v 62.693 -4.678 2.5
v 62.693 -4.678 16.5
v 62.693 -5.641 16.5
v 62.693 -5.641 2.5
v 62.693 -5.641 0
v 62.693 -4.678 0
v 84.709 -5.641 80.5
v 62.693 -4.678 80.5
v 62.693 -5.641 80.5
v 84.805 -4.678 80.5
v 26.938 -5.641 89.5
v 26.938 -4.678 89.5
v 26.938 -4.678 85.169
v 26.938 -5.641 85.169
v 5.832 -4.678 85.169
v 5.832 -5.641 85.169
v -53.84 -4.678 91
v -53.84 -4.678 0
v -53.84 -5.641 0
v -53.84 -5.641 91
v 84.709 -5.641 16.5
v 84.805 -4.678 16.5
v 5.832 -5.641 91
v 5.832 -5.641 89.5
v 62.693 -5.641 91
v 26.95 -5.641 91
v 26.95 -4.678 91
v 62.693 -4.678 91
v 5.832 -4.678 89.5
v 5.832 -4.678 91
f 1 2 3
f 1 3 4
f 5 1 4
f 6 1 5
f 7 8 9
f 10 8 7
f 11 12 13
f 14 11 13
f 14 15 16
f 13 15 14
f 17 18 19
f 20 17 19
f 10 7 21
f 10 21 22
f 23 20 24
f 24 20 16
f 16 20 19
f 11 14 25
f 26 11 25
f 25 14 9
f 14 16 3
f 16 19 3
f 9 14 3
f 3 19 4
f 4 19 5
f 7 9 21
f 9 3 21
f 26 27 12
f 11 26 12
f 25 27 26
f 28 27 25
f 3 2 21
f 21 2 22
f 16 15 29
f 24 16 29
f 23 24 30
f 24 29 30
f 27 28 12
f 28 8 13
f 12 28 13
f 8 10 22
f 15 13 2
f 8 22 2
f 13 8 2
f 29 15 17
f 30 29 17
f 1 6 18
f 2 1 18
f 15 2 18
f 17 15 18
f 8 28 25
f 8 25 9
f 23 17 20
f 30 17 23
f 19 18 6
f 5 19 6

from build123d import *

# Parameters (mm, degrees)
SALIENTE_EXTRUIR1_DEPTH = 91
CROQUIS3_W              = 21.106040847
CROQUIS3_H              = 4.330702007
CROQUIS3_W_2            = 30.122472971
CROQUIS3_H_2            = 14
CORTAR_EXTRUIR2_DEPTH   = 91
CROQUIS4_W              = 22.111814678
CROQUIS4_H              = 2.5
CORTAR_EXTRUIR3_DEPTH   = 10
CORTAR_EXTRUIR4_DEPTH   = 10


with BuildPart() as part:
    # Croquis1 → Saliente-Extruir1 (new body)
    with BuildSketch(Plane.XY):
        Polygon((-53.839851527, -4.678337985), (-53.839851527, -5.641142559), (84.70895538, -5.641142559), (84.804732082, -4.678337985), align=None)
    extrude(amount=SALIENTE_EXTRUIR1_DEPTH)

    # Croquis3 → Cortar-Extruir2 (cut)
    with BuildSketch(Plane(origin=(0, -4.678337985, 0), x_dir=(1, 0, 0), z_dir=(0, 1, 0))):
        with Locations((16.385259295, -87.334648996)):
            Rectangle(CROQUIS3_W, CROQUIS3_H)
        with Locations((77.75415389, -9.5)):
            Rectangle(CROQUIS3_W_2, CROQUIS3_H_2)
        with Locations((77.75415389, -87.5)):
            Rectangle(CROQUIS3_W_2, CROQUIS3_H_2)
    extrude(amount=-CORTAR_EXTRUIR2_DEPTH, mode=Mode.SUBTRACT)

    # Croquis4 → Cortar-Extruir3 (cut)
    with BuildSketch(Plane(origin=(0, -4.678337985, 0), x_dir=(1, 0, 0), z_dir=(0, 1, 0))):
        with Locations((73.748824743, -1.25)):
            Rectangle(CROQUIS4_W, CROQUIS4_H)
    extrude(amount=-CORTAR_EXTRUIR3_DEPTH, mode=Mode.SUBTRACT)

    # Croquis5 → Cortar-Extruir4 (cut)
    with BuildSketch(Plane(origin=(0, -4.678337985, 0), x_dir=(1, 0, 0), z_dir=(0, 1, 0))):
        Polygon((5.832238872, -89.5), (5.832238872, -91), (26.950480476, -91), (26.938279719, -89.5), align=None)
    extrude(amount=-CORTAR_EXTRUIR4_DEPTH, mode=Mode.SUBTRACT)


solid = part.part
